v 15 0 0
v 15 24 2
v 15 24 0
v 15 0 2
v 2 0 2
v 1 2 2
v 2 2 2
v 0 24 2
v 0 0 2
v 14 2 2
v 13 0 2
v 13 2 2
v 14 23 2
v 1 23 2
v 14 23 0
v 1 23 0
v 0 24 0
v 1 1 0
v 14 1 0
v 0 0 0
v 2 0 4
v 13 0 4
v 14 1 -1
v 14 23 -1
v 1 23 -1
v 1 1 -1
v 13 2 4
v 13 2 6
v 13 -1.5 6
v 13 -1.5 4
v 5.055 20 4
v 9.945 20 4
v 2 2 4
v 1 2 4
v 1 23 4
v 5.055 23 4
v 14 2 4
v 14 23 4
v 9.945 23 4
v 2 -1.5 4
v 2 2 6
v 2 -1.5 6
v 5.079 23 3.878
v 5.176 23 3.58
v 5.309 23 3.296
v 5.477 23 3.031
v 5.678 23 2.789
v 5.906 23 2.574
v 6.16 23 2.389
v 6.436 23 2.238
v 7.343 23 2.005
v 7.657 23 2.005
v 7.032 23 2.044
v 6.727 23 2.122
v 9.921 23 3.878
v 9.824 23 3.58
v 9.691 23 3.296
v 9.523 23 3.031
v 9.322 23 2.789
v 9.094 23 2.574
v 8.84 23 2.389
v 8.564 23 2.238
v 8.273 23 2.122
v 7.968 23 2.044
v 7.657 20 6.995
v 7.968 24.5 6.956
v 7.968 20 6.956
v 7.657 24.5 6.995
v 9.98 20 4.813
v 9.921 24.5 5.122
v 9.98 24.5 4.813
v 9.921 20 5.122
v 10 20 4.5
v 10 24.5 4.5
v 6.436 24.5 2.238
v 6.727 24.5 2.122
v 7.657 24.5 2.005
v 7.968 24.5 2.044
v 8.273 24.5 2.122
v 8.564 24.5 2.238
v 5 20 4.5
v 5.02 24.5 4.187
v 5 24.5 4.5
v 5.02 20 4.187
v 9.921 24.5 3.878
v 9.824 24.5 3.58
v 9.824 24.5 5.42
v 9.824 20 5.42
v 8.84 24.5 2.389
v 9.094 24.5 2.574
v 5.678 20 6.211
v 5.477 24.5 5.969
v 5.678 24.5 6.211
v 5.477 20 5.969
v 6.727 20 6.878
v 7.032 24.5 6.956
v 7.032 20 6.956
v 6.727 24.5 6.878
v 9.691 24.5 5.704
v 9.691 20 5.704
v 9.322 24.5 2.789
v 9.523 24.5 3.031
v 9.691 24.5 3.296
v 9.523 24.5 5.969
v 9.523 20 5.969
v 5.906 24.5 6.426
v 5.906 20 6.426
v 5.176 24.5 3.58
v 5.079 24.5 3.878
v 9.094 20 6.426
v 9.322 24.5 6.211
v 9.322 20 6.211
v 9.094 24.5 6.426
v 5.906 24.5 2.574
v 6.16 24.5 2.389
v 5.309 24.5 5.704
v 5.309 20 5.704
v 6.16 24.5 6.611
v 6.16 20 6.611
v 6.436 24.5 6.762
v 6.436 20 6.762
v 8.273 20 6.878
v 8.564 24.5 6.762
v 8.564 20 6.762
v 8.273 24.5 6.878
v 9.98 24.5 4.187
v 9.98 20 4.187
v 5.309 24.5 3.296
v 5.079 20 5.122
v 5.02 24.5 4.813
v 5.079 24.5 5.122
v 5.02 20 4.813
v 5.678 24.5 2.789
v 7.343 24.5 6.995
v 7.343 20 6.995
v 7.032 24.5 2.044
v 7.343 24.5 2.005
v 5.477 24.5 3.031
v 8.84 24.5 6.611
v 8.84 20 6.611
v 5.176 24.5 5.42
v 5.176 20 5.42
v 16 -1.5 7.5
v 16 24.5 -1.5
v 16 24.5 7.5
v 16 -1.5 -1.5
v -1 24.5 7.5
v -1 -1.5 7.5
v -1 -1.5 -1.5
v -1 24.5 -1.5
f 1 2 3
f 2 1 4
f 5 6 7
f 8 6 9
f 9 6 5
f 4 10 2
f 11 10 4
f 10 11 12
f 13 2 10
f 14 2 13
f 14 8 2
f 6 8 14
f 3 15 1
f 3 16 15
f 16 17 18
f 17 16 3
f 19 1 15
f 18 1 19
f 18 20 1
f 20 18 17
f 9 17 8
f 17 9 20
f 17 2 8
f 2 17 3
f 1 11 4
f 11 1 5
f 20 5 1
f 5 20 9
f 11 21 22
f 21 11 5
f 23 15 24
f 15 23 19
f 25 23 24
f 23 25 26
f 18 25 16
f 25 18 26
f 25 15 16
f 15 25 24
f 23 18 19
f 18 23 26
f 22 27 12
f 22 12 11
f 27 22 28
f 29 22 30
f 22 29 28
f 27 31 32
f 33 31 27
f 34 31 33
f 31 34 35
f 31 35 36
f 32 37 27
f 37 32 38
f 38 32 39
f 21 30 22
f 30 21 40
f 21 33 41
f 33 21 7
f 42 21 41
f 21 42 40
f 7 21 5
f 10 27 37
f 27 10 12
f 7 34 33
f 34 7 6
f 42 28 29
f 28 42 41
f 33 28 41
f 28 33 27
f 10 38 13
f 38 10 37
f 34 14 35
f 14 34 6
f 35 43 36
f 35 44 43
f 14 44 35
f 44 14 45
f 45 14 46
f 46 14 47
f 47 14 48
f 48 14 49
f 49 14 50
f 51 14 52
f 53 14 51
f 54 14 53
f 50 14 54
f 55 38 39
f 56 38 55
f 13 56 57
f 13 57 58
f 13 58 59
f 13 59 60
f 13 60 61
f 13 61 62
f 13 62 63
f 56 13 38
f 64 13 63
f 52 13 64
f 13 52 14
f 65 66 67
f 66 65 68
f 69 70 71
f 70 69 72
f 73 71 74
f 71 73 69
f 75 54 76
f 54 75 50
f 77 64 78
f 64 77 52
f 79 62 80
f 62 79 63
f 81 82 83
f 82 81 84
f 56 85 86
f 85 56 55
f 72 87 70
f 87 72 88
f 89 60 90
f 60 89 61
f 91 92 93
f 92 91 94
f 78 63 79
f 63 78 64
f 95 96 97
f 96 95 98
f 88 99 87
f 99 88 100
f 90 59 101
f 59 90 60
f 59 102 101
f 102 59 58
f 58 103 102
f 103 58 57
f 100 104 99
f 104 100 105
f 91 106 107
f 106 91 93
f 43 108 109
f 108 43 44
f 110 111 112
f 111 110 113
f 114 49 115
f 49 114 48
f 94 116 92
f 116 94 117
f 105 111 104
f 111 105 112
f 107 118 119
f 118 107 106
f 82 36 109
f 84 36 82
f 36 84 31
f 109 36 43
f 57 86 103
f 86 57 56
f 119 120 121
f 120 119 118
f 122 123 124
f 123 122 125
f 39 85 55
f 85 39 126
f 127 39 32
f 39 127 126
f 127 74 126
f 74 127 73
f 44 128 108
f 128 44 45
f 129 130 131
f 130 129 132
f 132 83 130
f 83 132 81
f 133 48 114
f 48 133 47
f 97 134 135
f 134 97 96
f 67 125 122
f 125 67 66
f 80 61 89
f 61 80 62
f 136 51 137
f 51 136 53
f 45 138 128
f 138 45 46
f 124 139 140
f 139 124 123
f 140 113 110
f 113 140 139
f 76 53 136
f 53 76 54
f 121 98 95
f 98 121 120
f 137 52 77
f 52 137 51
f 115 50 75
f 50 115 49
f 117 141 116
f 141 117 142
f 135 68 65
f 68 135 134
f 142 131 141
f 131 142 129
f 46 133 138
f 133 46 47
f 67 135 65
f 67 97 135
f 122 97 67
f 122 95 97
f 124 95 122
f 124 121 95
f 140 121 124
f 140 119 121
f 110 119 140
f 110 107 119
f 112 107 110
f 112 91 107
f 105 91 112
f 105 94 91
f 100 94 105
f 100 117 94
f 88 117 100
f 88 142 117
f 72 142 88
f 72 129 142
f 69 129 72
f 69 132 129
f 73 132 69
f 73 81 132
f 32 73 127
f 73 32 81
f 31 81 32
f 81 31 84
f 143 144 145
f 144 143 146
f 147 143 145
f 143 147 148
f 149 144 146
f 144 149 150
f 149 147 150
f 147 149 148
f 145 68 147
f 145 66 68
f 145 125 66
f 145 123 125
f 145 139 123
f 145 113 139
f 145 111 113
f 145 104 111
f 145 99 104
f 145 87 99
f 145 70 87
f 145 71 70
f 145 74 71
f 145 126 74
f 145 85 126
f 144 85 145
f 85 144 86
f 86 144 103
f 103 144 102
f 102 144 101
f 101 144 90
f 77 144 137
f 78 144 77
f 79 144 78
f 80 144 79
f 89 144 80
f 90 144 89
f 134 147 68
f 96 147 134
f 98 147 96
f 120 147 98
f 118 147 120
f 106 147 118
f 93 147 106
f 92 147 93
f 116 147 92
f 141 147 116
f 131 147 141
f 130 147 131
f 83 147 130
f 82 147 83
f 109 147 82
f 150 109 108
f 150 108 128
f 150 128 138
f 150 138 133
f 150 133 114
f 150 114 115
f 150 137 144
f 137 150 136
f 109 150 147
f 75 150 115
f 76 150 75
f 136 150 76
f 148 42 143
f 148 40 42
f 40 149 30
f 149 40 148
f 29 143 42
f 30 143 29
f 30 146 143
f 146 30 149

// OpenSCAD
module board() {
  union() {
    //Board
    //color("Green", 0.5)
      cube([15, 24, 2]);
    //Solded components space
    translate([1, 1, -1])
      cube([13, 22, 1]);
    //Black plastic space
    //color("Red", 0.5)
      translate([2, 0, 2])
      cube([11, 2, 2]);
    //Connection pins (the 3 of them)
    translate([2, -6, 4])
      cube([11, 8, 2]);
    //Photo resistor connection space
    translate([1, 2, 2])
      cube([13, 21, 2]);
    //Photo resistor
    translate([7.5,25,4.5]) rotate([90,0,0]) cylinder(5,2.5,2.5,$fn=50);
  }
}

difference() {
  difference() {
    color("blue", 0.5) translate([-1,-1.5,-1.5]) cube([17, 26, 9]);
    board();
  }
}
